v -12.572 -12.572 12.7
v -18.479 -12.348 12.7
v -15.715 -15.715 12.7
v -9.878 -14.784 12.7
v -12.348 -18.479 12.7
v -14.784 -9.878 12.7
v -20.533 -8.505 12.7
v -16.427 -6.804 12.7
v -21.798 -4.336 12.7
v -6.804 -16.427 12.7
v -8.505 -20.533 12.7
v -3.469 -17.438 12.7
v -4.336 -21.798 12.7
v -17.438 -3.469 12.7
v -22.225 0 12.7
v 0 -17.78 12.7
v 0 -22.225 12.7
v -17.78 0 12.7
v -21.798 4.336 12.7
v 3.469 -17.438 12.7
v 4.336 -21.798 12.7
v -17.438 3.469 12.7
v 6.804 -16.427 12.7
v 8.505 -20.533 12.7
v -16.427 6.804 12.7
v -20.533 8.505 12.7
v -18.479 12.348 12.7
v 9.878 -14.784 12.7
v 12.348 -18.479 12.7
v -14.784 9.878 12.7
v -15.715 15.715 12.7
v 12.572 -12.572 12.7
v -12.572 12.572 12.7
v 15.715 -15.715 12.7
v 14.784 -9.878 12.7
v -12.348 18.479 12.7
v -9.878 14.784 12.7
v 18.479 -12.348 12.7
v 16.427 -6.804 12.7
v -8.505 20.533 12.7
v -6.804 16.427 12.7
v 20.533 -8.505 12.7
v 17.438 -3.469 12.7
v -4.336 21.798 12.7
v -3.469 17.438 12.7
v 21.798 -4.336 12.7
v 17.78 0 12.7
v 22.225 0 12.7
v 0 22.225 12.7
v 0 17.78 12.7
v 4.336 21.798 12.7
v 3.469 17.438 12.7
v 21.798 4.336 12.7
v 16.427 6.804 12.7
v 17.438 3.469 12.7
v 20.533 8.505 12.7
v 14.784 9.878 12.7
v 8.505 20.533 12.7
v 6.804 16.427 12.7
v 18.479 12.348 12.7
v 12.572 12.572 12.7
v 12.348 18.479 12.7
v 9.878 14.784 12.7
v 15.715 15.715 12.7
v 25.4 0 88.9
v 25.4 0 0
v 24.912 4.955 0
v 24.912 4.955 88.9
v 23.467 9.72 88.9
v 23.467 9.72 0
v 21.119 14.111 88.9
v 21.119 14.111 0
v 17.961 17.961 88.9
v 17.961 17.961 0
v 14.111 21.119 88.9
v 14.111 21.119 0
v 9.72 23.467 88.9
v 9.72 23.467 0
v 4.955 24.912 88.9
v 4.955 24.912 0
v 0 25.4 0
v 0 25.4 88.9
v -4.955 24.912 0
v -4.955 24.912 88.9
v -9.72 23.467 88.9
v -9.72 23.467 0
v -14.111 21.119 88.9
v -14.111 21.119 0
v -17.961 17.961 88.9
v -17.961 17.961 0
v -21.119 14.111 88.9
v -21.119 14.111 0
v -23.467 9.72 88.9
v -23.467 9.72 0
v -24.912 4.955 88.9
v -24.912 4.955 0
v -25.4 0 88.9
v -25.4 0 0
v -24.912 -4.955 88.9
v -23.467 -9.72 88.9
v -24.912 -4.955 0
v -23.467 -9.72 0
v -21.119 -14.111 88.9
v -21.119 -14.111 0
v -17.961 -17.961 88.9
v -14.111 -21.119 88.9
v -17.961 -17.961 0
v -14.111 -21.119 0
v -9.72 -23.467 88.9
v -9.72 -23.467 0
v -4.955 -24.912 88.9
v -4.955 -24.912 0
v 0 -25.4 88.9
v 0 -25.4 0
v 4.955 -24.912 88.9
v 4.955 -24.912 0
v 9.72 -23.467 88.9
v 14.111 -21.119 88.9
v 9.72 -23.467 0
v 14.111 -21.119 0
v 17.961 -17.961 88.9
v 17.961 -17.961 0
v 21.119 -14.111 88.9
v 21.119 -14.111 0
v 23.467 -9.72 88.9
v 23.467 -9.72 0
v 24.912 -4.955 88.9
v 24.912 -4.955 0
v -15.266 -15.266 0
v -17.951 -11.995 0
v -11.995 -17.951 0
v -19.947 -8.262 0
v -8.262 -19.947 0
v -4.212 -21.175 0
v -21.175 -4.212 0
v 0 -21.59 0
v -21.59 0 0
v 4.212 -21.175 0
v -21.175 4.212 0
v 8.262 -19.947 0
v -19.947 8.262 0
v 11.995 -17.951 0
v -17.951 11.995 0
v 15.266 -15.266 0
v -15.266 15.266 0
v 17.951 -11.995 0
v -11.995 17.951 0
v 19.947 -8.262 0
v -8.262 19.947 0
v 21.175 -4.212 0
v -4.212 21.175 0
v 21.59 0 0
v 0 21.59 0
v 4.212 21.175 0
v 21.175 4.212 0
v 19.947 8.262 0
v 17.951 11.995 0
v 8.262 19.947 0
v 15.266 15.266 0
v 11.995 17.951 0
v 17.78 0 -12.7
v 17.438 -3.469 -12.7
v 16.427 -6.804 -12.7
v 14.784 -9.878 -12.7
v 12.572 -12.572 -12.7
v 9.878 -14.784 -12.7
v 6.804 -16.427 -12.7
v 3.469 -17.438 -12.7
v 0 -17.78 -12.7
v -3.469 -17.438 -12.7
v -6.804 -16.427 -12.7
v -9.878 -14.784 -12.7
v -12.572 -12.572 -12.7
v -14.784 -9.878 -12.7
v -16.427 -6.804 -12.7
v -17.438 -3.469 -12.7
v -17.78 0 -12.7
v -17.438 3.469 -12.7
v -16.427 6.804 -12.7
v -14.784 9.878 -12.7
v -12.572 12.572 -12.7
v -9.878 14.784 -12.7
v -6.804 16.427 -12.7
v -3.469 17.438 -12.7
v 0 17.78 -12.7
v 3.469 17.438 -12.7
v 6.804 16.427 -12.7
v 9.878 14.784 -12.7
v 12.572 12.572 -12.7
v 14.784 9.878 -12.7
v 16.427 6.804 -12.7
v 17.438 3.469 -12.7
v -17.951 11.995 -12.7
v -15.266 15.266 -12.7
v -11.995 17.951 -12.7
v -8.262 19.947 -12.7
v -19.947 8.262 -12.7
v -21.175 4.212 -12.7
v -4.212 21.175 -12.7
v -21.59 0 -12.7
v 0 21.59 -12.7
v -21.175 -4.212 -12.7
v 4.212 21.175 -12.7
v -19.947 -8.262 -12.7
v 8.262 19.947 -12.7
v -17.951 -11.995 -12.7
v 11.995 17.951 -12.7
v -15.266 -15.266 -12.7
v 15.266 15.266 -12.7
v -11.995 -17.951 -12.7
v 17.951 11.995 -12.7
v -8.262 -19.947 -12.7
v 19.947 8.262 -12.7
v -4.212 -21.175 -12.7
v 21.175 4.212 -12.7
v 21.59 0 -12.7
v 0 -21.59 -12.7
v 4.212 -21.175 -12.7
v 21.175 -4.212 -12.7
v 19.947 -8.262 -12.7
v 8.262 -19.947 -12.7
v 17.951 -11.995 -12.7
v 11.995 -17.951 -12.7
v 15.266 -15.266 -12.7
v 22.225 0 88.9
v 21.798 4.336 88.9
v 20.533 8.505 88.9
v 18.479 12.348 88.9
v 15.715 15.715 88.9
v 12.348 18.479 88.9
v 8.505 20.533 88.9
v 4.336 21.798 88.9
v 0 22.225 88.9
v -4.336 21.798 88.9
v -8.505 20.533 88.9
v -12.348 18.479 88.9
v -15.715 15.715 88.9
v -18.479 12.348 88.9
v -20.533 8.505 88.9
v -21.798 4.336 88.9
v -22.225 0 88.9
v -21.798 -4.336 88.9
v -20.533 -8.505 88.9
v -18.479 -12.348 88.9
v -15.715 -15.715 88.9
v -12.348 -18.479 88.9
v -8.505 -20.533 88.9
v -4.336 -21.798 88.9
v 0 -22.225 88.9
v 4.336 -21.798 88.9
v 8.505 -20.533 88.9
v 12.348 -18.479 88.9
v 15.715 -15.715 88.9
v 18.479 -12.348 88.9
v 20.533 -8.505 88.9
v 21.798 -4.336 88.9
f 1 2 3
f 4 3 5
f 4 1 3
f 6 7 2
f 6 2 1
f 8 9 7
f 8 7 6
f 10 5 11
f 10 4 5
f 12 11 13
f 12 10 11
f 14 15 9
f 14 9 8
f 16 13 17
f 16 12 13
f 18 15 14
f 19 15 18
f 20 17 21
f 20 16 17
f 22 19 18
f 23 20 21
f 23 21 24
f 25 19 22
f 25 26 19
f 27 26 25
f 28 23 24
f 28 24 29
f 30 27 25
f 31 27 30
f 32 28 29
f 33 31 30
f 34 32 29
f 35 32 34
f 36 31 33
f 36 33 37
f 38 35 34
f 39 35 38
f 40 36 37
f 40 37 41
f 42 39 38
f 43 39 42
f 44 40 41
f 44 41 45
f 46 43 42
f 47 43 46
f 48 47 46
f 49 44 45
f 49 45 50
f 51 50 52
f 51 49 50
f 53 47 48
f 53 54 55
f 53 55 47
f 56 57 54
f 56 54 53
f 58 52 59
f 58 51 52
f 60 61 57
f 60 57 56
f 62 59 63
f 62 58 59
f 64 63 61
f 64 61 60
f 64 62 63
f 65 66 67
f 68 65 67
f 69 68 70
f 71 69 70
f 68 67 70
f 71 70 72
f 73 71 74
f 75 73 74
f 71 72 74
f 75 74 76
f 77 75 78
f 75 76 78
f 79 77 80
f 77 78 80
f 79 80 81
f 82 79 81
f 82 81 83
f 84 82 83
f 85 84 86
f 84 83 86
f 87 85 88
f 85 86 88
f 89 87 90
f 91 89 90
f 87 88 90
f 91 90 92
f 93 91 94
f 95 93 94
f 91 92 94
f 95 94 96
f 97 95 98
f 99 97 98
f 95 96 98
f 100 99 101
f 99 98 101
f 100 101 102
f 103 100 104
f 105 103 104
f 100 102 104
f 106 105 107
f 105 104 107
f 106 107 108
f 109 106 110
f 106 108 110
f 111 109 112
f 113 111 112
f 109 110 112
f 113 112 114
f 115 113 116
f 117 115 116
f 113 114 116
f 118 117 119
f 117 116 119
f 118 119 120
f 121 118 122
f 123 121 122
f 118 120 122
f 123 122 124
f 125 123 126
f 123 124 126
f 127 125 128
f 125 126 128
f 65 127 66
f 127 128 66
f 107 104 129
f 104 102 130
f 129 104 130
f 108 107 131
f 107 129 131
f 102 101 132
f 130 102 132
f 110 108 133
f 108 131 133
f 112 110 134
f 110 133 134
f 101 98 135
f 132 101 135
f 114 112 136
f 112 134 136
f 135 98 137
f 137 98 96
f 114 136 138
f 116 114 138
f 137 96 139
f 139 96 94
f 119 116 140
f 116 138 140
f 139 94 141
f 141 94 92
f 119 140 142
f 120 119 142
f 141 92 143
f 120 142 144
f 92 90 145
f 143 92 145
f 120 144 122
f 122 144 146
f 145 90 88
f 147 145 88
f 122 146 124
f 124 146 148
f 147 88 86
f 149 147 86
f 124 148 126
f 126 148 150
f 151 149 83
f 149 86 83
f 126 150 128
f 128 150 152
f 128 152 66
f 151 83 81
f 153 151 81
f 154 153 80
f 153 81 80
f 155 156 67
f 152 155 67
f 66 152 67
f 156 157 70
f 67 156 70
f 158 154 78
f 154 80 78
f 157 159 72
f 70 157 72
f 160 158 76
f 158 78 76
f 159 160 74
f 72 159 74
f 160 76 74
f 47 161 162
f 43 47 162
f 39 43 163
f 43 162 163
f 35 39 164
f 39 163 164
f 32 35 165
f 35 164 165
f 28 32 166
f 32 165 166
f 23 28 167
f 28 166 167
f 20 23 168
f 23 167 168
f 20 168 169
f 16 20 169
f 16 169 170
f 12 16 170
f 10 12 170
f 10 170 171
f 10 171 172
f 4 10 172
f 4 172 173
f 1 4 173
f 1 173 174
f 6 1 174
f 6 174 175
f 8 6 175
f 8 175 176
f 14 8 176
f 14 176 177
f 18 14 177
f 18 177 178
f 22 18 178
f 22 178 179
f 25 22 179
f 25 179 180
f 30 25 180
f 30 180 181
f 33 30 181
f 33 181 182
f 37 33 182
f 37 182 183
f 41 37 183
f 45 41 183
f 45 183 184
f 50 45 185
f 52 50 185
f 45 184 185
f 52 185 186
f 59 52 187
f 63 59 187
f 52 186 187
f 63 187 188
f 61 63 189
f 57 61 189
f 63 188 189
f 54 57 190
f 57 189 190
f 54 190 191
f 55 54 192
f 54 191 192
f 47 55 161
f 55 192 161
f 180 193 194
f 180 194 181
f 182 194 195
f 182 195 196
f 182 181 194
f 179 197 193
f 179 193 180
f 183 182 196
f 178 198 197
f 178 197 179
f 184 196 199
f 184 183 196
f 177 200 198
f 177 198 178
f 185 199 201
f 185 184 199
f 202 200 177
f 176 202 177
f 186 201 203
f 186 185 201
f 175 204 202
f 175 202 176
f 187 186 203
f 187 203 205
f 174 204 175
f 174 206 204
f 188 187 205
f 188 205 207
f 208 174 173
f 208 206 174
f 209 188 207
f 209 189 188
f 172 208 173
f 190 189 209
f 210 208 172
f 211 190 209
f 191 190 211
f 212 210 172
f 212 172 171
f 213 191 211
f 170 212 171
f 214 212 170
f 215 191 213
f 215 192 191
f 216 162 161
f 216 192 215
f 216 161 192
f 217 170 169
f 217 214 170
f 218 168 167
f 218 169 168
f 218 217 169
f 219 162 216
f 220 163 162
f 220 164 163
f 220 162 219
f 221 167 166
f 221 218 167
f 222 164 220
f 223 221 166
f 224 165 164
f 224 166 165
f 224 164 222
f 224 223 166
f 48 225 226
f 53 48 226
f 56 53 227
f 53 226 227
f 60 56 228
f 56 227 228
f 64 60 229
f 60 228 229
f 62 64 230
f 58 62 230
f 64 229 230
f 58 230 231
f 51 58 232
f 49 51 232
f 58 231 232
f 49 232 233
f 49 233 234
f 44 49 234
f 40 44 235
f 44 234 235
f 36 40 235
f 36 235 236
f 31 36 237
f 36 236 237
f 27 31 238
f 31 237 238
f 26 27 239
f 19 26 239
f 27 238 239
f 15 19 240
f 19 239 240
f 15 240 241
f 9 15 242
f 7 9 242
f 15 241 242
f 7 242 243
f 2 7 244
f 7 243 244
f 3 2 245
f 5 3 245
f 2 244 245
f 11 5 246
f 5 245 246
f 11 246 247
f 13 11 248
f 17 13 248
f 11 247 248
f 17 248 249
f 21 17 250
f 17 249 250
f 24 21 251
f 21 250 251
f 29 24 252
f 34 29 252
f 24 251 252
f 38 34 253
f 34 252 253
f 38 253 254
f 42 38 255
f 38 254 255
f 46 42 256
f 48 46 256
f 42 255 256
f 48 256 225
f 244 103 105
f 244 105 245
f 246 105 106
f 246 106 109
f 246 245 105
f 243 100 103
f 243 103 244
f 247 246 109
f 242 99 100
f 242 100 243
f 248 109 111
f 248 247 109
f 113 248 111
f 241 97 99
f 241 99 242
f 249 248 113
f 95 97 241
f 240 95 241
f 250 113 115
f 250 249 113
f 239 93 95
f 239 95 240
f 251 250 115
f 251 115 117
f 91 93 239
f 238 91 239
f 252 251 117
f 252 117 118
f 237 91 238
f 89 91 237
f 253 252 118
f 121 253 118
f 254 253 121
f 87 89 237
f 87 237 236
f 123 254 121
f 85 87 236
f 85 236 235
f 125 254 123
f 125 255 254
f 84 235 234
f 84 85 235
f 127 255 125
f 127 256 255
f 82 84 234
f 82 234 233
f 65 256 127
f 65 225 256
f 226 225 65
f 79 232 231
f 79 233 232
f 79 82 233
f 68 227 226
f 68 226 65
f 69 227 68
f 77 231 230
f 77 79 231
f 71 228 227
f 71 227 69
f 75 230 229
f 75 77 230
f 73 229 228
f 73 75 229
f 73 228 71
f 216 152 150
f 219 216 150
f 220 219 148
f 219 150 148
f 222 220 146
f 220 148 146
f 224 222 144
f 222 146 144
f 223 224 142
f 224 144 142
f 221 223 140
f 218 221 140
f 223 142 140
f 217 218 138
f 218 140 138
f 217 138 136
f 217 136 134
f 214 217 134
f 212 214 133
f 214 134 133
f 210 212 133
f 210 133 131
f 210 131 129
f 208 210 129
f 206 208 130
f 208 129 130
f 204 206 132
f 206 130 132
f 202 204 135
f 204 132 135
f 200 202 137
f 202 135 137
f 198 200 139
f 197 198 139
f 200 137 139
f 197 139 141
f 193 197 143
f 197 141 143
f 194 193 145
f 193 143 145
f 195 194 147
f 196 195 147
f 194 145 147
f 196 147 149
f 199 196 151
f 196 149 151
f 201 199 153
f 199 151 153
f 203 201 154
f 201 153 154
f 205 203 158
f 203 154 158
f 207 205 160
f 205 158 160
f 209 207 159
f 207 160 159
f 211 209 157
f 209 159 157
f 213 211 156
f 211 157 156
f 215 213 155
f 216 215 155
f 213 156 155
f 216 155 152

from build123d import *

# Parameters (mm, degrees)
F0_R     = 25.4
F1_DEPTH = 88.9
F2_R     = 22.225
F3_DEPTH = 76.2
F4_R     = 21.59
F5_DEPTH = 12.7
F6_R     = 17.78
F7_DEPTH = 101.601


with BuildPart() as f1:
    # F0 (on Top) → F1 (new body)
    with BuildSketch(Plane.XY):
        Circle(F0_R)
    extrude(amount=F1_DEPTH)

    # F2 (on face) → F3 (cut)
    with BuildSketch(Plane.XY.offset(88.9)):
        Circle(F2_R)
    extrude(amount=-F3_DEPTH, mode=Mode.SUBTRACT)

    # F4 (on face) → F5 (join)
    with BuildSketch(Plane(origin=(0, 0, 0), x_dir=(1, 0, 0), z_dir=(0, 0, -1))):
        Circle(F4_R)
    extrude(amount=F5_DEPTH)

    # F6 (on face) → F7 (cut, through all)
    with BuildSketch(Plane(origin=(0, 0, -12.7), x_dir=(1, 0, 0), z_dir=(0, 0, -1))):
        Circle(F6_R)
    extrude(amount=-F7_DEPTH, mode=Mode.SUBTRACT)


solid = f1.part
